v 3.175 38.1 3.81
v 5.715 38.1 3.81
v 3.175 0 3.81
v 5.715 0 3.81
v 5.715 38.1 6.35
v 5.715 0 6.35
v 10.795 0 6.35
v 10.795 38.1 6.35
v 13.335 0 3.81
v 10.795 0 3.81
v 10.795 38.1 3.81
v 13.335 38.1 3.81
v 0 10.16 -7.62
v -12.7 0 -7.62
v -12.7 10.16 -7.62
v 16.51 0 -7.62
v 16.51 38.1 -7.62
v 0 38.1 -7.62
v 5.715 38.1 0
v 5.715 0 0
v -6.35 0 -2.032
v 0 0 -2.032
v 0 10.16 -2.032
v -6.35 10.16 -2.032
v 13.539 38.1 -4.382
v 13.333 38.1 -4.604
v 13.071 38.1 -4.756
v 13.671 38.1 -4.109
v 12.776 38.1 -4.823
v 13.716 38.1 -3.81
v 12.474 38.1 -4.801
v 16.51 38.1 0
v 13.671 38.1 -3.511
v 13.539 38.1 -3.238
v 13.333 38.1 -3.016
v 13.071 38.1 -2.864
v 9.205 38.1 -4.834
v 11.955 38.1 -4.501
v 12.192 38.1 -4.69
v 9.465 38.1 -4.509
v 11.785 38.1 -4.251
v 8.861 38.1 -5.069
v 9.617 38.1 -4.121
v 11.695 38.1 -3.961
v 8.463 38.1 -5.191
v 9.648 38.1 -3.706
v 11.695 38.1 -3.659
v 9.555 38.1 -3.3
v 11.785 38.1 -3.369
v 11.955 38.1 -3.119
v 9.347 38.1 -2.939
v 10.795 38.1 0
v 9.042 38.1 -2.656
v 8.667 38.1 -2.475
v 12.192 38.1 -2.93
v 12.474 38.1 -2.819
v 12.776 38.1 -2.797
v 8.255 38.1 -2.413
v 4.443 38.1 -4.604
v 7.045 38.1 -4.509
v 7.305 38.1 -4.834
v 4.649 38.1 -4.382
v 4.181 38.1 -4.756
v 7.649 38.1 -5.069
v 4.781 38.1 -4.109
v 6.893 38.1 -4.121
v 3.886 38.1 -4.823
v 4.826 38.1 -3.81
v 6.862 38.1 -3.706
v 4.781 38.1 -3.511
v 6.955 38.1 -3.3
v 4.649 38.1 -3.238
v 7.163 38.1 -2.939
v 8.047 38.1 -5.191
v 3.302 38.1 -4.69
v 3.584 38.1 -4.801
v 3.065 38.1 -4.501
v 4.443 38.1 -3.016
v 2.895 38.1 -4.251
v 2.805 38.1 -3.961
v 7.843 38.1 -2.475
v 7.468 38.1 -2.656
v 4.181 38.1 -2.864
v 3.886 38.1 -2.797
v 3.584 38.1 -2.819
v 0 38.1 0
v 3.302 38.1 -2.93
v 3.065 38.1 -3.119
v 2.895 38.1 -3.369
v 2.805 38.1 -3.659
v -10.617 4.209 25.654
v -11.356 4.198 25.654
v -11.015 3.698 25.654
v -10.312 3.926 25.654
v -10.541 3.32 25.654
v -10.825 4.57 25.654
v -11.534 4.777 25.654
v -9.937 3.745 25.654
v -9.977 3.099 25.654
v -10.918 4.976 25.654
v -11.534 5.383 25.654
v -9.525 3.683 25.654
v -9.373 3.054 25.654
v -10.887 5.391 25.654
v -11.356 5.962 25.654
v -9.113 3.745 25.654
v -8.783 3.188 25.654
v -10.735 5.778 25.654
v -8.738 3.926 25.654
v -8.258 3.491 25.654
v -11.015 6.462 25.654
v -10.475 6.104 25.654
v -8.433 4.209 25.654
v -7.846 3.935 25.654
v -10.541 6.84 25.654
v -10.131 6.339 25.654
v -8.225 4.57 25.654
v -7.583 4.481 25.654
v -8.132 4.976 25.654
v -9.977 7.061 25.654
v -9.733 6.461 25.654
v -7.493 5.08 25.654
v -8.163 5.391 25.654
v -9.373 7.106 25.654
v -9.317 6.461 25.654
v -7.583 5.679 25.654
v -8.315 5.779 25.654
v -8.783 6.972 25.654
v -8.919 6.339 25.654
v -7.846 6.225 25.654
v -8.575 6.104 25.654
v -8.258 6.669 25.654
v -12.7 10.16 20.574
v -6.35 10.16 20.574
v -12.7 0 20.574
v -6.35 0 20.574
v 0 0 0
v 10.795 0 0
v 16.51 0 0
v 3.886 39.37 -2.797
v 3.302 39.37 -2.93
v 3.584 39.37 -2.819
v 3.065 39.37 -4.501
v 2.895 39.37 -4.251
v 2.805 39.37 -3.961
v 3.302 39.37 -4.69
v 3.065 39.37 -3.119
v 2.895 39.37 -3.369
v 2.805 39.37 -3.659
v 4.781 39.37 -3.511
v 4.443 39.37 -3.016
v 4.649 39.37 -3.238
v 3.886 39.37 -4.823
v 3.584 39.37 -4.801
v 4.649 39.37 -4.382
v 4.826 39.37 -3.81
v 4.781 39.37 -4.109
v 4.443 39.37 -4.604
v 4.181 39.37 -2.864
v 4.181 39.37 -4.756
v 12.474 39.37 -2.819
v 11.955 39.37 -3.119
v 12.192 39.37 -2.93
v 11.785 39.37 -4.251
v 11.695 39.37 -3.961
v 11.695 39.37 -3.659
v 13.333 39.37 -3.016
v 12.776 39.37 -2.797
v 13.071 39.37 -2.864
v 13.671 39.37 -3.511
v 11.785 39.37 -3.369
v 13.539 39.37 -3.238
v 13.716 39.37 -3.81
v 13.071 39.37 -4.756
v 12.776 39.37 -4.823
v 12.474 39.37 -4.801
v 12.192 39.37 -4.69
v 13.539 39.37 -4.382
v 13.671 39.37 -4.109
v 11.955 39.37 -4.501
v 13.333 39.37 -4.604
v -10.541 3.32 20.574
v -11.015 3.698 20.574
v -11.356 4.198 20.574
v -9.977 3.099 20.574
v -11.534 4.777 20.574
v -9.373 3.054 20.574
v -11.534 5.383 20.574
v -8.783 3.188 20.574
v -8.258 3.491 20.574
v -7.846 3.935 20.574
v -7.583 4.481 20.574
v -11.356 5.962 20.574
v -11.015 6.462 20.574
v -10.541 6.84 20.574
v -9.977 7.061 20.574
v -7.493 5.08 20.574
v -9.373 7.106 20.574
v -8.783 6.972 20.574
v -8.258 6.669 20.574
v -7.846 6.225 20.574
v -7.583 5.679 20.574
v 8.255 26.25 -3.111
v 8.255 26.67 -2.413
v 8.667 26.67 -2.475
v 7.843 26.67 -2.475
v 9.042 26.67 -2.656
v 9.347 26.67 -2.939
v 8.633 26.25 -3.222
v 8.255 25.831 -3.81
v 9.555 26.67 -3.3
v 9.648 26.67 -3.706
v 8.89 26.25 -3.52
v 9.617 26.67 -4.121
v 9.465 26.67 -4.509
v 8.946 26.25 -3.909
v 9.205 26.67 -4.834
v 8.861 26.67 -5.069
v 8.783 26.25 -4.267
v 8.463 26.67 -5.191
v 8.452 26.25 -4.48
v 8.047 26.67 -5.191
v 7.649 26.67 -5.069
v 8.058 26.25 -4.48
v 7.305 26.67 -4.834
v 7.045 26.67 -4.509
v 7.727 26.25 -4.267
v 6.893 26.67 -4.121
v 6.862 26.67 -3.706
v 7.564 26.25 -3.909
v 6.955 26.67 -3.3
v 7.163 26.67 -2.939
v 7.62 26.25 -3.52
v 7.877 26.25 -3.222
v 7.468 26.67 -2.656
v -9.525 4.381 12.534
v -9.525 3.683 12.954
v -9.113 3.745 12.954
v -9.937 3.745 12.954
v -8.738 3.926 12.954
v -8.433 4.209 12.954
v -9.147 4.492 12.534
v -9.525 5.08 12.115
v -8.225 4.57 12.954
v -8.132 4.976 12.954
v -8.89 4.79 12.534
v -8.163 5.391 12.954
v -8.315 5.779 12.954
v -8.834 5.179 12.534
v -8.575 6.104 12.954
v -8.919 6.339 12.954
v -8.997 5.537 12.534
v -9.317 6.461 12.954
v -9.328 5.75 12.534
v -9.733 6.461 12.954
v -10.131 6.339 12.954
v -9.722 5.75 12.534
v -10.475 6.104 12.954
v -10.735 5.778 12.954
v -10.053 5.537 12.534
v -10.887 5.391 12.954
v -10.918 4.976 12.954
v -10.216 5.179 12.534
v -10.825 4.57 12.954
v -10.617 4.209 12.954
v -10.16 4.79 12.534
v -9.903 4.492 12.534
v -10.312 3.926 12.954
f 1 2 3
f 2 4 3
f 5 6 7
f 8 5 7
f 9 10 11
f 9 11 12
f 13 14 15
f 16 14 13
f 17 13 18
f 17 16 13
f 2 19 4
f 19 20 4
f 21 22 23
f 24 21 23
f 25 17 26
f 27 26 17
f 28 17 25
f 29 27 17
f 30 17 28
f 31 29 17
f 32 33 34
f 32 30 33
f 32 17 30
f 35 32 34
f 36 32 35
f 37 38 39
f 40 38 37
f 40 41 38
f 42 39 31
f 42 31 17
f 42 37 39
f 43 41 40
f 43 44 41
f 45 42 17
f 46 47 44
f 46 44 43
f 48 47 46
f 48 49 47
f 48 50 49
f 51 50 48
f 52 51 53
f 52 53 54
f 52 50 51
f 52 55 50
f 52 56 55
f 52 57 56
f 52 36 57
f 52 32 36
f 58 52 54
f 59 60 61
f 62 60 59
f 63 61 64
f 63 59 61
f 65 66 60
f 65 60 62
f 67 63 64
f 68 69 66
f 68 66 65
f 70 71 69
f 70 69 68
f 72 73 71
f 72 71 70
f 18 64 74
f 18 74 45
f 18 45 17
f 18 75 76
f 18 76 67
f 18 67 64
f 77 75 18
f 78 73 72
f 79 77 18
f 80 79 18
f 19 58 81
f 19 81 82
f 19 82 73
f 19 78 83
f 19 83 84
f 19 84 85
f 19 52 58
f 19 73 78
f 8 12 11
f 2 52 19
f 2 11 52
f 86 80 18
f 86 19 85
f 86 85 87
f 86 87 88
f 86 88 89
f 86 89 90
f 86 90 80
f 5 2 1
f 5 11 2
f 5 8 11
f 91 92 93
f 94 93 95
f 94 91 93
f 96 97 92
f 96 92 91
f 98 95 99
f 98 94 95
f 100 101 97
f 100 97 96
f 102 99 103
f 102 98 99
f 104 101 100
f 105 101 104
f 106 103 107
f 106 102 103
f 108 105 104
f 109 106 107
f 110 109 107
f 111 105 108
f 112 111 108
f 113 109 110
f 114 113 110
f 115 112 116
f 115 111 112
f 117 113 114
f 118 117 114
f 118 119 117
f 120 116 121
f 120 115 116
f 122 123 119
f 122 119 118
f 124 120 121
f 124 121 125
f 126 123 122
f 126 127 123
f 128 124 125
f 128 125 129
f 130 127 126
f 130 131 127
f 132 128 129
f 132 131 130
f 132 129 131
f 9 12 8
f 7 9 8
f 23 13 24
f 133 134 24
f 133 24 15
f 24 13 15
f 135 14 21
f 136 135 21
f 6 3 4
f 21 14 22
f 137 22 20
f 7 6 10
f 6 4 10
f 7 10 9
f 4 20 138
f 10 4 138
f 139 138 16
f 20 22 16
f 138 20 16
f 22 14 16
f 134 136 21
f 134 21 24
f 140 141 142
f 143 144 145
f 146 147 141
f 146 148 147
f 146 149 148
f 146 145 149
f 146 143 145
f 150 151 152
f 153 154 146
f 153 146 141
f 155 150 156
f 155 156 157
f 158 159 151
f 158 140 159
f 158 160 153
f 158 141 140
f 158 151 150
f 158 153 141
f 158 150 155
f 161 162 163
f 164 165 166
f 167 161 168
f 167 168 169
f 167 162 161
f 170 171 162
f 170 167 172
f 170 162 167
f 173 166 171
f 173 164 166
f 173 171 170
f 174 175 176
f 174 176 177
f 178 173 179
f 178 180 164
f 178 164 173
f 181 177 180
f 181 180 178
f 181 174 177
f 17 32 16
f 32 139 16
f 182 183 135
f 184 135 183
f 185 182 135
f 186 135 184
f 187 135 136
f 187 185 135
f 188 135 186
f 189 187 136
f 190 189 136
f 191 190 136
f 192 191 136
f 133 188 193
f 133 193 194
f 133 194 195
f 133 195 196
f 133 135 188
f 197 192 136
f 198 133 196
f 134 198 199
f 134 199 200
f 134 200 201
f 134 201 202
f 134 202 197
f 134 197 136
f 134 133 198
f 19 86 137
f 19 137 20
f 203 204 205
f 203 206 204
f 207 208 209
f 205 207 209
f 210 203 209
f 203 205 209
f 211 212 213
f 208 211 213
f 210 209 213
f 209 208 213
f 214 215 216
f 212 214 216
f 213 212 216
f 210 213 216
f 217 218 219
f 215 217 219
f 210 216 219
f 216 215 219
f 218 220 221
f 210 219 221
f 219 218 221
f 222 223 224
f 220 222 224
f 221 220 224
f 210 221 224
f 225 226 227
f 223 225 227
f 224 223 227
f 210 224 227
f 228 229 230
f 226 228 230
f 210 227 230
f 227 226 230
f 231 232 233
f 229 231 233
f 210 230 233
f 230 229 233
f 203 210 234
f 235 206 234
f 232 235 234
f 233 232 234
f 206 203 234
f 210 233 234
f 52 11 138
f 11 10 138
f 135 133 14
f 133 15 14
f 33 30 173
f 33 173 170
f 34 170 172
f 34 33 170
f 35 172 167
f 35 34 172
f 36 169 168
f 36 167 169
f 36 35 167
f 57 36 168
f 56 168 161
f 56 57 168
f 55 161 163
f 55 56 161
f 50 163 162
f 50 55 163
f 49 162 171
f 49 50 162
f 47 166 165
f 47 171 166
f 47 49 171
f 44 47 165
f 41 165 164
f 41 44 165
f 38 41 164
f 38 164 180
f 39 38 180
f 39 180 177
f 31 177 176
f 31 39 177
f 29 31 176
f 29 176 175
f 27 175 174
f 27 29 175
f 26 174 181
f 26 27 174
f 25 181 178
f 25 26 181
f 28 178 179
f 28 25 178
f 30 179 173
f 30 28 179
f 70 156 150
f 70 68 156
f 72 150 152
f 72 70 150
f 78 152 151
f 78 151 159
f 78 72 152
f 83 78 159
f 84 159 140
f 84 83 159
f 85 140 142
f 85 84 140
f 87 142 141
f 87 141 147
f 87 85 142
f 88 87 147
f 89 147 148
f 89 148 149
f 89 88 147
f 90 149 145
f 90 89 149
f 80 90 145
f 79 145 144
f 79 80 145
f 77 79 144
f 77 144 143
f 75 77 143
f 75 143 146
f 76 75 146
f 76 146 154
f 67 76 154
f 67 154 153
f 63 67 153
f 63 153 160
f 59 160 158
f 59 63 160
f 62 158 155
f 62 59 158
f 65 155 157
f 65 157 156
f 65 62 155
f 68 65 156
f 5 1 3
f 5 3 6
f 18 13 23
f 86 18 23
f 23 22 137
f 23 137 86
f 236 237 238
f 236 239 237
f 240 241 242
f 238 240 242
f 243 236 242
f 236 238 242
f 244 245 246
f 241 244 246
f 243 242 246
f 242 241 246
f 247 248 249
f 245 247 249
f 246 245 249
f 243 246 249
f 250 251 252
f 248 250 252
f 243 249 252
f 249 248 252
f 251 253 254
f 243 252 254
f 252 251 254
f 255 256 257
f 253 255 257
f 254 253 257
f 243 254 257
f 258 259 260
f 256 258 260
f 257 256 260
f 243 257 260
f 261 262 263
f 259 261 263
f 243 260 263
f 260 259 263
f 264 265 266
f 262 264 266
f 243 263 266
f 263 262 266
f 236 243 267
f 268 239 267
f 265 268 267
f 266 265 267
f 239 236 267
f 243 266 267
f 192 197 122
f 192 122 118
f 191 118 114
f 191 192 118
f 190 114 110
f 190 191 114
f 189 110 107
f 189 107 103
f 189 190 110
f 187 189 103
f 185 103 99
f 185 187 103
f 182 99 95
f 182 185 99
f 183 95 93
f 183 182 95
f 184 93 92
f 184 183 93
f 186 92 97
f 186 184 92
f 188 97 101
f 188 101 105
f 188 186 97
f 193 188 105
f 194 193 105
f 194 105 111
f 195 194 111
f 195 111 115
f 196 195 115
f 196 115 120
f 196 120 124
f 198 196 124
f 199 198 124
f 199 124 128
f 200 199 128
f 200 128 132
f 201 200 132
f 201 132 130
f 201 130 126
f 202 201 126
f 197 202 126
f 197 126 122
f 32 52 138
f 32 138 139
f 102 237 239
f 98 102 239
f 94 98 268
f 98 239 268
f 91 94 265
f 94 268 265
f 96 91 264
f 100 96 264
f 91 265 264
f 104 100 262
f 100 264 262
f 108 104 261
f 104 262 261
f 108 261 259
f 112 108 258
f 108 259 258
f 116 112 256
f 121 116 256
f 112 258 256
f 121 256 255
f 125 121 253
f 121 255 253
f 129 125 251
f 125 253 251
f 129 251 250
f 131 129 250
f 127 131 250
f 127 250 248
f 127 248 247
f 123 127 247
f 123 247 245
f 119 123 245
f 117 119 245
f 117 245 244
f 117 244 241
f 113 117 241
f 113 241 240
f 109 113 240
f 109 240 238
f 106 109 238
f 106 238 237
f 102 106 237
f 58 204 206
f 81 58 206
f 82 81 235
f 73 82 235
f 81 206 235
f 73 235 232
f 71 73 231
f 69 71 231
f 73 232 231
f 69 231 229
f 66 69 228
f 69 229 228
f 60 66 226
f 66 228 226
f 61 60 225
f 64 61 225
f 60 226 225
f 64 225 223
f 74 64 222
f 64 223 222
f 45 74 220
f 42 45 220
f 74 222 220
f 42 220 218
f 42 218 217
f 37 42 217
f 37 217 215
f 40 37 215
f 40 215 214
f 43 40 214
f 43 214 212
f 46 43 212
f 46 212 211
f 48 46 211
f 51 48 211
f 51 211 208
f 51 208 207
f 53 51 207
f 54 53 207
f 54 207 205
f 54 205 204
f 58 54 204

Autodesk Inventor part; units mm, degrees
ref_plane "YZ Plane" through (0, 0, 0) normal (1, 0, 0) x (0, 1, 0)
ref_plane "XZ Plane" through (0, 0, 0) normal (0, 1, 0) x (-1, 0, 0)
ref_plane "XY Plane" through (0, 0, 0) normal (0, 0, 1) x (1, 0, 0)
sketch "Sketch1" plane through (0, 0, 0) normal (0, 1, 0) x (-1, 0, 0)
  line L0 (0, 0) -> (-16.51, 0)
  line L1 (-16.51, 0) -> (-16.51, -7.62)
  line L2 (-16.51, -7.62) -> (0, -7.62)
  line L3 (0, -7.62) -> (0, 0)
  line L4 (-8.255, 0) -> (-5.715, 0)
  line L5 (-5.715, 0) -> (-5.715, 6.35)
  line L6 (-5.715, 6.35) -> (-10.795, 6.35)
  line L7 (-10.795, 6.35) -> (-10.795, 0)
  line L8 (-5.715, -7.62) -> (-5.715, -8.89)
  line L9 (-5.715, -8.89) -> (-10.795, -8.89)
  line L10 (-10.795, -8.89) -> (-10.795, -7.62)
  line L11 (-10.795, 6.35) -> (-10.795, 3.81)
  line L12 (-10.795, 3.81) -> (-13.335, 3.81)
  line L13 (-13.335, 3.81) -> (-10.795, 6.35)
  line L14 (-5.715, 6.35) -> (-5.715, 3.81)
  line L15 (-5.715, 3.81) -> (-3.175, 3.81)
  line L16 (-3.175, 3.81) -> (-5.715, 6.35)
  point P0 (-8.255, -7.62)
  point P1 (0, -3.81)
  point P2 (-16.51, -3.81)
  dimension "d0" = 16.51
  dimension "d1" = 7.62
  dimension "d2" = 2.54
  dimension "d3" = 6.35
  dimension "d4" = 5.08
  dimension "d5" = 1.27
  dimension "d6" = 2.54
  dimension "d7" = 2.54
  dimension "d8" = 2.54
  dimension "d9" = 2.54
extrude "Extrusion1" add sketch "Sketch1" along normal blind 38.1
sketch "Sketch2" plane through (0, 38.1, 0) normal (0, 1, 0) x (1, 0, 0)
  line L0 (16.51, 0) -> (16.51, 7.62) projected
  line L1 (16.51, 3.81) -> (12.7, 3.81)
  line L2 (0, 7.62) -> (0, 0) projected
  circle A0 centre (12.7, 3.81) radius 1.016
  dimension "d12" = 3.81
  dimension "d14" = 2.032
extrude "Extrusion2" add sketch "Sketch2" along normal blind 1.27
sketch "Sketch3" plane through (0, 38.1, 0) normal (0, 1, 0) x (1, 0, 0)
  line L0 (0, 7.62) -> (0, 0) projected
  line L1 (0, 3.81) -> (3.81, 3.81)
  circle A0 centre (3.81, 3.81) radius 1.016
  dimension "d20" = 3.81
  dimension "d21" = 2.032
extrude "Extrusion3" add sketch "Sketch3" along normal blind 1.27
sketch "Sketch6" plane through (0, 38.1, 0) normal (0, 1, 0) x (1, 0, 0)
  line L0 (16.51, 0) -> (16.51, 7.62) projected
  line L1 (16.51, 3.81) -> (8.255, 3.81)
  circle A0 centre (8.255, 3.81) radius 1.397
  point P0 (0, 0)
  dimension "d24" = 8.255
  dimension "d25" = 2.794
hole "Hole1" at (8.255, 38.1, -3.81) at (8.255, 38.1, -3.81) direction (0, -1, 0) diameter 2.794 depth 11.43 tip angle 118
sketch "Sketch13" plane through (0, 0, -7.62) normal (-1, 0, 0) x (0, 0, 1)
  line L0 (0, 0) -> (0, 38.1) projected
  line L1 (0, 0) -> (5.588, 0)
  line L2 (5.588, 0) -> (5.588, 10.16)
  line L3 (5.588, 10.16) -> (0, 10.16)
  line L4 (0, 10.16) -> (0, 0)
  point P0 (7.62, 0)
  dimension "d68" = 5.588
  dimension "d69" = 10.16
extrude "Extrusion7" add sketch "Sketch13" along normal blind 12.7
sketch "Sketch14" plane through (0, 0, -2.032) normal (0, 0, 1) x (1, 0, 0)
  line L0 (-12.7, 10.16) -> (-12.7, 0) projected
  line L1 (-12.7, 0) -> (-6.35, 0)
  line L2 (-6.35, 0) -> (-6.35, 10.16)
  line L3 (-6.35, 10.16) -> (-12.7, 10.16)
  line L4 (-12.7, 10.16) -> (-12.7, 0)
  point P0 (0, 0)
  dimension "d72" = 6.35
  dimension "d73" = 10.16
extrude "Extrusion8" add sketch "Sketch14" along normal blind 22.606
sketch "Sketch15" plane through (0, 0, 20.574) normal (0, 0, 1) x (1, 0, 0)
  line L0 (-12.7, 10.16) -> (-12.7, 0) projected
  line L1 (-12.7, 5.08) -> (-9.525, 5.08)
  circle A0 centre (-9.525, 5.08) radius 2.032
  point P0 (0, 0)
  dimension "d79" = 3.175
  dimension "d80" = 4.064
extrude "Extrusion9" add sketch "Sketch15" along normal blind 5.08
sketch "Sketch16" plane through (-9.525, 5.08, 25.654) normal (0, 0, 1) x (1, 0, 0)
  point P0 (9.525, -5.08)
sketch "Sketch17" plane through (-9.525, 5.08, 25.654) normal (0, 0, 1) x (1, 0, 0)
  circle A0 centre (0, 0) radius 1.397
  point P0 (9.525, -5.08)
  dimension "d83" = 2.794
hole "Hole3" at (-9.525, 5.08, 25.654) direction (0, 0, -1) diameter 2.794 depth 12.7 tip angle 118
sketch "Sketch18" plane through (10.795, 0, -8.89) normal (0, 0, -1) x (-1, 0, 0)
  line L0 (0, 0) -> (5.08, 0) projected
  line L1 (0, 38.1) -> (5.08, 38.1)
  line L2 (5.08, 38.1) -> (5.08, 0)
  line L3 (5.08, 0) -> (0, 0)
  line L4 (0, 0) -> (0, 38.1)
  point P0 (10.795, 0)
extrude "Extrusion10" cut sketch "Sketch18" against normal blind 1.27
properties part number "Grab1"
